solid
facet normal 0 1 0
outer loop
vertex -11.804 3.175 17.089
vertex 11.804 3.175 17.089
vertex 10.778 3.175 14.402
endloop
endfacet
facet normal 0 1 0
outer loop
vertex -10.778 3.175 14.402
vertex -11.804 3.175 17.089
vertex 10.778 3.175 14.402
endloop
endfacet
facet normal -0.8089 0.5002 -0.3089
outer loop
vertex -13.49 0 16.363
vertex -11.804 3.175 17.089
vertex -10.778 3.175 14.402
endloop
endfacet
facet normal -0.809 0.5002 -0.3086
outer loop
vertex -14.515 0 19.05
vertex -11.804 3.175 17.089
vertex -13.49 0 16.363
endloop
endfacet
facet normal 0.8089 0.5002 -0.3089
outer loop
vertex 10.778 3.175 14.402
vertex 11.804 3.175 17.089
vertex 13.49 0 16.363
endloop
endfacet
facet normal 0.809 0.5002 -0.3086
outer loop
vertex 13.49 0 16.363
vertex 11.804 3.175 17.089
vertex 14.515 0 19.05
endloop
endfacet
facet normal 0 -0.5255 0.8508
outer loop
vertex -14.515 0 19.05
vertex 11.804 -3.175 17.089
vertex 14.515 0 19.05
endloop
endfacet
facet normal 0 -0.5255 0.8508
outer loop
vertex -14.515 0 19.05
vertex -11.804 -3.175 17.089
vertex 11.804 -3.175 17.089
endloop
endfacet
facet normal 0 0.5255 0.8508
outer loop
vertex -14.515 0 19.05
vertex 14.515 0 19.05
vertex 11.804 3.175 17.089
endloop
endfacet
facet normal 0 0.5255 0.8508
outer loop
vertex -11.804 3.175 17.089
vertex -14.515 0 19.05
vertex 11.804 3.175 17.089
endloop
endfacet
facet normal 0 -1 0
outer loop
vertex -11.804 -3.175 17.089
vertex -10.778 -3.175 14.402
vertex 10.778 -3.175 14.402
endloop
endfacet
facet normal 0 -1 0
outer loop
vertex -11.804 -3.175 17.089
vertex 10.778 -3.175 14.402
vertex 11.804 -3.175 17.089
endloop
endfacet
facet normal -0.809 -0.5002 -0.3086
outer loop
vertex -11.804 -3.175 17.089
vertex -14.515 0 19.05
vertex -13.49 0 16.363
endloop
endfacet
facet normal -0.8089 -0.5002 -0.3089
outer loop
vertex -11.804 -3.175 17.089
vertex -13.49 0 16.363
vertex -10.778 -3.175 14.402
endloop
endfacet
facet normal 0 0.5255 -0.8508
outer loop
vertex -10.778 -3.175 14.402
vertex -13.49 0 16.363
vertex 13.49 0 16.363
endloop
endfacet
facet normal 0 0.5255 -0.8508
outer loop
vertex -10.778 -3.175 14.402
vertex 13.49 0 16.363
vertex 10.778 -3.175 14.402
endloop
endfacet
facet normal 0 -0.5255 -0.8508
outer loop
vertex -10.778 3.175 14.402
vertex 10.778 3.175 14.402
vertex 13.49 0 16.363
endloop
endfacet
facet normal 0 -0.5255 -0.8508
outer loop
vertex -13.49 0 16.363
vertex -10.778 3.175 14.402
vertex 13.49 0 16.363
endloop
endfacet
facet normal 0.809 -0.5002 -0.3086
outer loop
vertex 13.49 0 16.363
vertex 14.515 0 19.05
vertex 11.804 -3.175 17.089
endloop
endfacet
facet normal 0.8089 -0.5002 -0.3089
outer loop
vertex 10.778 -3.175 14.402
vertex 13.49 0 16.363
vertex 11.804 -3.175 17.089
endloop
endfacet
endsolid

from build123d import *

# Parameters (mm, degrees)
F0_W           = 31.75
F0_H           = 38.1
F1_DEPTH       = 19.05
F3_DEPTH       = 19.051
F5_DEPTH       = 18.9707249215
F7_DEPTH       = 18.9707249215
F9_DEPTH       = 25.4
F12_DEPTH      = 14.5164068706
F12_DEPTH_BACK = 14.5164068706


with BuildPart() as f1:
    # F0 (on Right) → F1 (new body)
    with BuildSketch(Plane.YZ):
        Rectangle(F0_W, F0_H)
    extrude(amount=F1_DEPTH)

    # F2 (on face) → F3 (cut, through all)
    with BuildSketch(Plane.YZ.offset(19.05)):
        Polygon((15.875, 19.05), (0, 19.05), (15.875, 9.2454001677), align=None)
        Polygon((-15.875, 9.2454001677), (0, 19.05), (-15.875, 19.05), align=None)
        Polygon((-15.875, -19.05), (15.875, -19.05), (15.875, 6.5585523178), (0, 16.3631521501), (-15.875, 6.5585523178), align=None)
    extrude(amount=-F3_DEPTH, mode=Mode.SUBTRACT)

    # F4 (on face) → F5 (cut, through all)
    with BuildSketch(Plane(origin=(0, -8.5168191059, 13.7899053117), x_dir=(1, 0, 0), z_dir=(0, -0.5254716511, 0.8508111094))):
        Polygon((19.05, -10.060293047), (19.05, 16.251566953), (-0.0666852809, -10.060293047), align=None)
    extrude(amount=-F5_DEPTH, mode=Mode.SUBTRACT)

    # F6 (on face) → F7 (cut, through all)
    with BuildSketch(Plane(origin=(0, 8.5168191059, 13.7899053117), x_dir=(1, 0, 0), z_dir=(0, 0.5254716511, 0.8508111094))):
        Polygon((125.3145152414, -10.0102349529), (125.3145152414, 10.060293047), (110.7324230899, 10.060293047), align=None)
    extrude(amount=-F7_DEPTH, mode=Mode.SUBTRACT)

    # F8 (on face) → F9 (cut)
    with BuildSketch(Plane(origin=(0, 8.5168191059, 13.7899053117), x_dir=(1, 0, 0), z_dir=(0, 0.5254716511, 0.8508111094))):
        Polygon((-0.0666852809, 10.060293047), (19.05, -16.251566953), (19.05, 10.060293047), align=None)
    extrude(amount=-F9_DEPTH, mode=Mode.SUBTRACT)

    # F10: F1 across plane


with BuildPart() as f1_1:
    add(f1.part)
    add(f1.part.mirror(Plane.YZ))

    # F11 (on Right) → F12 (cut, two sides)
    with BuildSketch(Plane.YZ) as f12_sk:
        Polygon((-15.875, 9.2454001677), (-15.875, 6.5585523178), (-3.175, 14.4022321837), (-3.175, 17.0890800335), align=None)
        Polygon((15.875, 9.2454001677), (3.175, 17.0890800335), (3.175, 14.4022321837), (15.875, 6.5585523178), align=None)
    extrude(amount=-F12_DEPTH, mode=Mode.SUBTRACT)
    extrude(f12_sk.sketch, amount=F12_DEPTH_BACK, mode=Mode.SUBTRACT)


solid = f1_1.part
